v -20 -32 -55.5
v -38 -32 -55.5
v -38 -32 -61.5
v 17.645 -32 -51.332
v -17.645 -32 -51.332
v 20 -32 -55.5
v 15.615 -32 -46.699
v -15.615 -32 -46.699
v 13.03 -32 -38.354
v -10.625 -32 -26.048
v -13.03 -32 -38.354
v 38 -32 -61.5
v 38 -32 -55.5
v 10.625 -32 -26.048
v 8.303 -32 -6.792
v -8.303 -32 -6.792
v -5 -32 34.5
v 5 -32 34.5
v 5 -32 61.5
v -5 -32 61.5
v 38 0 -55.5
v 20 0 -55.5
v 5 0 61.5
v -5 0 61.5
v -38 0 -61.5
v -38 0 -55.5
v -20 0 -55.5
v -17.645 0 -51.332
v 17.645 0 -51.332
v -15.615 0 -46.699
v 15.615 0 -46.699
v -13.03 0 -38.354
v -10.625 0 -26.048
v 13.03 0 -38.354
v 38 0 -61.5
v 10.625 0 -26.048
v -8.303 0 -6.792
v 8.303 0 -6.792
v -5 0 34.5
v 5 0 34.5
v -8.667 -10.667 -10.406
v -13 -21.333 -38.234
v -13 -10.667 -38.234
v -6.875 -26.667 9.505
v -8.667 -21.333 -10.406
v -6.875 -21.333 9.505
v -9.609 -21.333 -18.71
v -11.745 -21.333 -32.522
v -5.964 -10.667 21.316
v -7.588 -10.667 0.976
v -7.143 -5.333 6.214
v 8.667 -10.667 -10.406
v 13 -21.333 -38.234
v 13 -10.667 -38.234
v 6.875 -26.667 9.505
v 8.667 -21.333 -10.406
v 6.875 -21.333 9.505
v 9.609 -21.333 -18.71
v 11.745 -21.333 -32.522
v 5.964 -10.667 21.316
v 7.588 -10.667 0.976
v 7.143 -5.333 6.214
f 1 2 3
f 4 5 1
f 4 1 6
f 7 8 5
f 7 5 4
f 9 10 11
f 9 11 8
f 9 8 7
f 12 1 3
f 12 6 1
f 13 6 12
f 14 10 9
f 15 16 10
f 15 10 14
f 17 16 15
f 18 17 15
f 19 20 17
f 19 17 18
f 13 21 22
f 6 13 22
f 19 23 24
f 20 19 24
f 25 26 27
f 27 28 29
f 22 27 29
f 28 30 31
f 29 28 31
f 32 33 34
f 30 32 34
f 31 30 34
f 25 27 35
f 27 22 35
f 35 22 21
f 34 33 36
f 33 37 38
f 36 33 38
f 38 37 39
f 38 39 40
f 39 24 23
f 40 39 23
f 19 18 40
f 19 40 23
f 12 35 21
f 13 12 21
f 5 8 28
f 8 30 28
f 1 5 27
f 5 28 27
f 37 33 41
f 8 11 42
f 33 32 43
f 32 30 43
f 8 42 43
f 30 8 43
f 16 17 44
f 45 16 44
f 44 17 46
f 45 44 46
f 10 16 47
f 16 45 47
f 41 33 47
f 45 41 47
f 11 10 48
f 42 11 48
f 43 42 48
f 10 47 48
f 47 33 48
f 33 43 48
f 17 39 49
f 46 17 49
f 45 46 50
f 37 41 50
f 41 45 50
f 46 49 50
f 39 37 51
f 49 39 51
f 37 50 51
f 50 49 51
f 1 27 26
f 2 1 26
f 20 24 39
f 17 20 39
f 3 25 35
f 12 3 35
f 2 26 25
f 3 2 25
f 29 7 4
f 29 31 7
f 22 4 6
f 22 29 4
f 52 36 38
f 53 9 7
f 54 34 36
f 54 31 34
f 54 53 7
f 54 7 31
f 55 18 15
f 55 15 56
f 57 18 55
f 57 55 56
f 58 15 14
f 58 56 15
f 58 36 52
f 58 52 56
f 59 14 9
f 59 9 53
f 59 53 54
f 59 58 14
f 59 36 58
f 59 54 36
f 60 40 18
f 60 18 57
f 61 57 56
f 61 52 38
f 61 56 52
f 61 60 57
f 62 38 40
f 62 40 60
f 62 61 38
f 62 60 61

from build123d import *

# Parameters (mm, degrees)
F1_DEPTH = 32
F3_DEPTH = 32


with BuildPart() as f1:
    # F0 (on Front) → F1 (new body)
    with BuildSketch(Plane.XZ):
        Polygon((-38, -55.5), (-38, -61.5), (38, -61.5), (38, -55.5), (20, -55.5), (5, -55.5), (-5, -55.5), (-20, -55.5), align=None)
        Polygon((-5, 34.5), (-5, -55.5), (5, -55.5), (5, 34.5), (5, 61.5), (-5, 61.5), align=None)
    extrude(amount=F1_DEPTH)

    # F2 (on Front) → F3 (join)
    with BuildSketch(Plane.XZ):
        with BuildLine():
            Line((5, -55.5), (20, -55.5))
            add(Edge.make_bspline(
                [(5, 34.5), (9, -21.117978), (11, -41.342697), (20, -55.5)],
                knots=[0, 0, 0, 0, 1, 1, 1, 1], degree=3))
            Line((5, 34.5), (5, -55.5))
        make_face()
        with BuildLine():
            add(Edge.make_bspline(
                [(-5, 34.5), (-9, -21.117978), (-11, -41.342697), (-20, -55.5)],
                knots=[0, 0, 0, 0, 1, 1, 1, 1], degree=3))
            Line((-20, -55.5), (-5, -55.5))
            Line((-5, -55.5), (-5, 34.5))
        make_face()
    extrude(amount=F3_DEPTH)


solid = f1.part
